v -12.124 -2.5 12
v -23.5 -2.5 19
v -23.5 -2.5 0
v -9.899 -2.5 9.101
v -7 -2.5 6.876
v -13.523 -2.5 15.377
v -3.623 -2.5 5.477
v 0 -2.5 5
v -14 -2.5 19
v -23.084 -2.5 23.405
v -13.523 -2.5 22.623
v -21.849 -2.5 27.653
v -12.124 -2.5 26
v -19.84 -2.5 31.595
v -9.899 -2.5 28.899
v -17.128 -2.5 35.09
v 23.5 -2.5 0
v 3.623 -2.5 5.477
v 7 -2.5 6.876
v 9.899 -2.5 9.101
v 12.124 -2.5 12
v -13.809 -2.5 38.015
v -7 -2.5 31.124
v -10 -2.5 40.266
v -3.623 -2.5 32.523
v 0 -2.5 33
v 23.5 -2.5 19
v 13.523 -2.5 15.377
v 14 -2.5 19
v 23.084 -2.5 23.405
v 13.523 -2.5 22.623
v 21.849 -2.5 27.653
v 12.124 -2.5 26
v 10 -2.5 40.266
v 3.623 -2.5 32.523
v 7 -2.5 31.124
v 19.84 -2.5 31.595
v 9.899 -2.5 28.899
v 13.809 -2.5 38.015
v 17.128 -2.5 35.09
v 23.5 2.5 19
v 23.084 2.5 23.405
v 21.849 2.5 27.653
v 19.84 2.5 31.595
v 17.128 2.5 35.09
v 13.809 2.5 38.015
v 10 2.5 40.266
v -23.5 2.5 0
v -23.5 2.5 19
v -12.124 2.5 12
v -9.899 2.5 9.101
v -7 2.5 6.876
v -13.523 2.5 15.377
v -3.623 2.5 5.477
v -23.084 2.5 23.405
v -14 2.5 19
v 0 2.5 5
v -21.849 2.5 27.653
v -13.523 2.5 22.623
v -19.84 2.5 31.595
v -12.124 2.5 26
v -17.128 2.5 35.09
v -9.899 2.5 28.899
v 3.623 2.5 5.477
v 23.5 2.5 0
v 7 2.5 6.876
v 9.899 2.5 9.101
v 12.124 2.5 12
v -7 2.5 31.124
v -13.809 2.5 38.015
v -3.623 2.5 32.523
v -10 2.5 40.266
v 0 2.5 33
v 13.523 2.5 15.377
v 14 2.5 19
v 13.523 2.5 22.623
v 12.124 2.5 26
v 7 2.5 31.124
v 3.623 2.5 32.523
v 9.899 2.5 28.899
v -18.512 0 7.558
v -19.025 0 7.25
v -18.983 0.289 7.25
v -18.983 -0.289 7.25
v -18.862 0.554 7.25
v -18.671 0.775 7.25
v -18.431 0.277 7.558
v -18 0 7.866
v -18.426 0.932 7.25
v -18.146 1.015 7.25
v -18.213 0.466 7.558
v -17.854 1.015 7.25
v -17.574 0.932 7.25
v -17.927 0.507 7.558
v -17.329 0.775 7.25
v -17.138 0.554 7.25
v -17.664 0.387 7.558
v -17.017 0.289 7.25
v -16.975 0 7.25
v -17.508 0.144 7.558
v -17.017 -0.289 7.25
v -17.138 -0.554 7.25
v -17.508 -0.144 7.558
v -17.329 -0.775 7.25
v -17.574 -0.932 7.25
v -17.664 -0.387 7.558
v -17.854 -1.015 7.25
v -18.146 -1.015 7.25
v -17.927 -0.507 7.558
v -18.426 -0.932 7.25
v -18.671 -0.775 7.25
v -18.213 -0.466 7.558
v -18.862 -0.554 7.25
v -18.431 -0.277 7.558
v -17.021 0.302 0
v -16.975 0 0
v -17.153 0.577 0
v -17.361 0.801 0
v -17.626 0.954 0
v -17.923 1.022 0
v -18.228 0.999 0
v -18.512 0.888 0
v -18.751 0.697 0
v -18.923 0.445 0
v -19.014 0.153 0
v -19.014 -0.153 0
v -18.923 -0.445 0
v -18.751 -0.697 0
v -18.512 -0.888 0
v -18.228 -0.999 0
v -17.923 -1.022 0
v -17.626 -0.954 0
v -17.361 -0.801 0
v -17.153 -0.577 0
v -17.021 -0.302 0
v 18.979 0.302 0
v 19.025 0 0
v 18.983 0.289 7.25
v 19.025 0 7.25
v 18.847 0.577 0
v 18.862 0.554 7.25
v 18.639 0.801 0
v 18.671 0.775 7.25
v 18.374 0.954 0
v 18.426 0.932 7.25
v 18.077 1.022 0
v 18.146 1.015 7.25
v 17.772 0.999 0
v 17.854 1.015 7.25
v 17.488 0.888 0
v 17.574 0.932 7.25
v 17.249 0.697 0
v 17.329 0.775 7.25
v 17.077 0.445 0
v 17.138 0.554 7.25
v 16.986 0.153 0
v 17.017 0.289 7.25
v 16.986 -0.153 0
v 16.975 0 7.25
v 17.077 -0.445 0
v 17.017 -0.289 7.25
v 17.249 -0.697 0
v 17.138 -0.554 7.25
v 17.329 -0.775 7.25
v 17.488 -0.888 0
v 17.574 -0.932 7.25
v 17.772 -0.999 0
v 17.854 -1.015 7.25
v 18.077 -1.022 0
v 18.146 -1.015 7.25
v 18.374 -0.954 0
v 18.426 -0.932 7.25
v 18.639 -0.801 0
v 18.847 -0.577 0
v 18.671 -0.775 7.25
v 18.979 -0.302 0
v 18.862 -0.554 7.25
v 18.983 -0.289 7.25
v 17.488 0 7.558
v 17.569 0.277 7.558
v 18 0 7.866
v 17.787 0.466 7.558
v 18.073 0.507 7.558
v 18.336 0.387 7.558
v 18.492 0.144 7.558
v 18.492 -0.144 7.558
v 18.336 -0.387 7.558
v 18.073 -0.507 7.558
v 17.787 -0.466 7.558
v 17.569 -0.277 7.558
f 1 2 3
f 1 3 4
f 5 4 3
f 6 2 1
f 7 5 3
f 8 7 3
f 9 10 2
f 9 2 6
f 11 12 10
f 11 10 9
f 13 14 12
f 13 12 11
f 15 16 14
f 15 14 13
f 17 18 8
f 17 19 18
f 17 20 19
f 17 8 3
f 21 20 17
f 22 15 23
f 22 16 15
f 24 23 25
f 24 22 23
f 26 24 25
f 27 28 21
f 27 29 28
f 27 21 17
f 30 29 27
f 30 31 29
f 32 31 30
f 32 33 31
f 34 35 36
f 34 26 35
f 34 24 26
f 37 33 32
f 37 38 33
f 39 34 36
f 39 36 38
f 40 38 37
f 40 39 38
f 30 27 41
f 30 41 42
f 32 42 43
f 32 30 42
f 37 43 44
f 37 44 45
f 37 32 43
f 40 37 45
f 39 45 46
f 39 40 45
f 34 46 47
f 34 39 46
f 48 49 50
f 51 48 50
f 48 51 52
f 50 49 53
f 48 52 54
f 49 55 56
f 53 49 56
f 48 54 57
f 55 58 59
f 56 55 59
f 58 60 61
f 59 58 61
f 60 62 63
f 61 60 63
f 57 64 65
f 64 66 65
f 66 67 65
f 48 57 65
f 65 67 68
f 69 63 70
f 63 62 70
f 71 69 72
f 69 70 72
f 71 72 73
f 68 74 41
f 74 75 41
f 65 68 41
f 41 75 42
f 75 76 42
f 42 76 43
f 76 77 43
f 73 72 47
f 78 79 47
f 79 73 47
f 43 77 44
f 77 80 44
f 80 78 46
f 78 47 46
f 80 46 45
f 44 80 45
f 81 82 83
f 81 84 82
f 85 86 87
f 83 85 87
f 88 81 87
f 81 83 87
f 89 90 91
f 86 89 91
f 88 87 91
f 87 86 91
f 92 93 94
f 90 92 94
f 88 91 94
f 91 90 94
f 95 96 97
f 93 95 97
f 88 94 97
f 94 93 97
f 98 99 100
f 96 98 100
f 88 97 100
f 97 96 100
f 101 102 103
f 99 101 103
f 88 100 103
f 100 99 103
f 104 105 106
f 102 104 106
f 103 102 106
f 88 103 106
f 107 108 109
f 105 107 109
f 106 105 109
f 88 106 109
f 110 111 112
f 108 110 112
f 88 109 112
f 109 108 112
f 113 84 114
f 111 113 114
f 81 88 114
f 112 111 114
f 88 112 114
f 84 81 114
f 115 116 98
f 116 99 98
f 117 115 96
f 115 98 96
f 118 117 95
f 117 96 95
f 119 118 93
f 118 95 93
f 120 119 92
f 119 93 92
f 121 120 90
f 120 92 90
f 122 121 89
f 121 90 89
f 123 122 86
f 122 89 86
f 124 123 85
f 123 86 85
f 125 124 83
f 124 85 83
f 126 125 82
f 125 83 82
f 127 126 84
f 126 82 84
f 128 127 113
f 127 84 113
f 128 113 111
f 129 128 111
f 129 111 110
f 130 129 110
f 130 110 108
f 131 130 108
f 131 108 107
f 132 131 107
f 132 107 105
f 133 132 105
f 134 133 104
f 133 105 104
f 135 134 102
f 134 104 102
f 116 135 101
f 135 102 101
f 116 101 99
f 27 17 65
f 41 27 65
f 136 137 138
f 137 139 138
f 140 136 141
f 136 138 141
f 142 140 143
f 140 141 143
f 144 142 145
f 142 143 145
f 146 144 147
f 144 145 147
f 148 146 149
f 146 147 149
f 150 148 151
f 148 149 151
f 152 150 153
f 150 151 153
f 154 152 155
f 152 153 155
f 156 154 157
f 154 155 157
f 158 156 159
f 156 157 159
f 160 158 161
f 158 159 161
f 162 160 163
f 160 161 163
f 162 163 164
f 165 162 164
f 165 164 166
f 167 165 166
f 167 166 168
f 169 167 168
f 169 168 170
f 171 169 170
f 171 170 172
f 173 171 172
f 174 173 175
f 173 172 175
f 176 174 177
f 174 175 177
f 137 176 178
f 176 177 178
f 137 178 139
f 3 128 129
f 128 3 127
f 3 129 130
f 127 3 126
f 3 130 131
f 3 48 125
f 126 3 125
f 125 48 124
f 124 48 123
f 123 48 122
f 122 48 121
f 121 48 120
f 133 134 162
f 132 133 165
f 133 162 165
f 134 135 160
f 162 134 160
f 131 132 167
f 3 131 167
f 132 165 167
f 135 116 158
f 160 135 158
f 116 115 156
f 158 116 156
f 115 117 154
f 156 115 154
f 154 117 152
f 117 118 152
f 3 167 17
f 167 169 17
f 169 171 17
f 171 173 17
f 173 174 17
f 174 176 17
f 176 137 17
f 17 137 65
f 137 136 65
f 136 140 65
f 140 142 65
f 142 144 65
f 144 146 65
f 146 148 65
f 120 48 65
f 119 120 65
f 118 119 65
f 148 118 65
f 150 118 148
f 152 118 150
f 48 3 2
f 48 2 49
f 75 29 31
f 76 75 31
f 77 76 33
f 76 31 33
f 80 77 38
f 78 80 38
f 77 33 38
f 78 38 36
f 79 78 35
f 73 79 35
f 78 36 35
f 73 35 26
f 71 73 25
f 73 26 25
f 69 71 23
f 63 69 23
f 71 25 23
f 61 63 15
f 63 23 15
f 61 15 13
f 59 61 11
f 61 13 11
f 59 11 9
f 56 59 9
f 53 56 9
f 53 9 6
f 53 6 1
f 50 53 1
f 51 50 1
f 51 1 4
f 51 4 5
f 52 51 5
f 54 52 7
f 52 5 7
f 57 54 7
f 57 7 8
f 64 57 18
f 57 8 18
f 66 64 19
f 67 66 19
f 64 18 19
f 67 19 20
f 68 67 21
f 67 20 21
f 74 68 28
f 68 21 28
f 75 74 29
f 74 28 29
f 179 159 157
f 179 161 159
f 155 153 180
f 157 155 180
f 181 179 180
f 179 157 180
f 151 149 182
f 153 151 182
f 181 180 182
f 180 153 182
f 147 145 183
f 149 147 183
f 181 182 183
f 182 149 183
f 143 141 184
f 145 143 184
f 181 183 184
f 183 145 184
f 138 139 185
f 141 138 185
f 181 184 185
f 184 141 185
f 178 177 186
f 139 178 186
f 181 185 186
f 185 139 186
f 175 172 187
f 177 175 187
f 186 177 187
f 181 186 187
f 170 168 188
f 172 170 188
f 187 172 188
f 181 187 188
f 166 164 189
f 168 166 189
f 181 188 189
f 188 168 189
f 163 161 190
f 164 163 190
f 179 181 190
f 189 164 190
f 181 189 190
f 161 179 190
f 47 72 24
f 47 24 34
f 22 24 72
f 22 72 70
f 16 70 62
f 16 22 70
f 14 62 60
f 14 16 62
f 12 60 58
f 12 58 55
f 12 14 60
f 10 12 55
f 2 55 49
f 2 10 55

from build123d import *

# Parameters (mm, degrees)
SKETCH_1_W               = 47
SKETCH_1_H               = 5
EXTRUDE_1_DEPTH          = 19
SKETCH_2_R               = 23.5
EXTRUDE_2_DEPTH          = 5
M2_5X0_45_1_D            = 2.05
M2_5X0_45_1_DEPTH        = 7.25
M2_5X0_45_1_TIP          = 0.615882135
CUT_EXTRUDE_1_DEPTH      = 5
CUT_EXTRUDE_2_DEPTH      = 1
CUT_EXTRUDE_2_DEPTH_BACK = 6
CUT_EXTRUDE_3_DEPTH      = 5


with BuildPart() as part:
    # ｽｹｯﾁ1 → ﾎﾞｽ - 押し出し1 (new body)
    with BuildSketch(Plane.XY):
        Rectangle(SKETCH_1_W, SKETCH_1_H)
    extrude(amount=EXTRUDE_1_DEPTH)

    # ｽｹｯﾁ2 → ﾎﾞｽ - 押し出し2 (add)
    with BuildSketch(Plane.XZ.offset(2.5)):
        with Locations((0, 19)):
            Circle(SKETCH_2_R)
    extrude(amount=-EXTRUDE_2_DEPTH)

    # M2.5x0.45 ねじ穴1
    with Locations(Plane(origin=(0, 0, 0), x_dir=(-1, 0, 0), z_dir=(0, 0, -1))):
        with Locations((18, 0), (-18, 0)):
            Hole(M2_5X0_45_1_D / 2, depth=M2_5X0_45_1_DEPTH)
            with Locations((0, 0, -(M2_5X0_45_1_DEPTH + M2_5X0_45_1_TIP / 2))):  # 118° drill point
                Cone(0, M2_5X0_45_1_D / 2, M2_5X0_45_1_TIP, mode=Mode.SUBTRACT)

    # ｽｹｯﾁ3 → ｶｯﾄ - 押し出し1 (cut)
    with BuildSketch(Plane.XZ.offset(2.5)):
        with BuildLine():
            Line((14, 19), (0, 19))
            Line((0, 19), (-14, 19))
            ThreePointArc((-14, 19), (0, 5), (14, 19))
        make_face()
        with BuildLine():
            Line((-14, 19), (0, 19))
            Line((0, 19), (14, 19))
            ThreePointArc((14, 19), (0, 33), (-14, 19))
        make_face()
    extrude(amount=-CUT_EXTRUDE_1_DEPTH, mode=Mode.SUBTRACT)

    # ｽｹｯﾁ10 → ｶｯﾄ - 押し出し2 (cut, two sides)
    with BuildSketch(Plane.XZ.offset(2.5)) as cut_extrude_2_sk:
        Polygon((136.961591201, 0), (13.829316686, 0), (-13.829316686, 0), (-136.961591201, 0), (-136.961591201, -246.26454903), (136.961591201, -246.26454903), align=None)
    extrude(amount=CUT_EXTRUDE_2_DEPTH, mode=Mode.SUBTRACT)
    extrude(cut_extrude_2_sk.sketch, amount=-CUT_EXTRUDE_2_DEPTH_BACK, mode=Mode.SUBTRACT)

    # ｽｹｯﾁ11 → ｶｯﾄ - 押し出し3 (cut)
    with BuildSketch(Plane(origin=(0, 2.5, 0), x_dir=(1, 0, 0), z_dir=(0, 1, 0))):
        with BuildLine():
            Line((-10, -40.266170318), (10, -40.266170318))
            ThreePointArc((10, -40.266170318), (0, -42.5), (-10, -40.266170318))
        make_face()
    extrude(amount=-CUT_EXTRUDE_3_DEPTH, mode=Mode.SUBTRACT)


solid = part.part
